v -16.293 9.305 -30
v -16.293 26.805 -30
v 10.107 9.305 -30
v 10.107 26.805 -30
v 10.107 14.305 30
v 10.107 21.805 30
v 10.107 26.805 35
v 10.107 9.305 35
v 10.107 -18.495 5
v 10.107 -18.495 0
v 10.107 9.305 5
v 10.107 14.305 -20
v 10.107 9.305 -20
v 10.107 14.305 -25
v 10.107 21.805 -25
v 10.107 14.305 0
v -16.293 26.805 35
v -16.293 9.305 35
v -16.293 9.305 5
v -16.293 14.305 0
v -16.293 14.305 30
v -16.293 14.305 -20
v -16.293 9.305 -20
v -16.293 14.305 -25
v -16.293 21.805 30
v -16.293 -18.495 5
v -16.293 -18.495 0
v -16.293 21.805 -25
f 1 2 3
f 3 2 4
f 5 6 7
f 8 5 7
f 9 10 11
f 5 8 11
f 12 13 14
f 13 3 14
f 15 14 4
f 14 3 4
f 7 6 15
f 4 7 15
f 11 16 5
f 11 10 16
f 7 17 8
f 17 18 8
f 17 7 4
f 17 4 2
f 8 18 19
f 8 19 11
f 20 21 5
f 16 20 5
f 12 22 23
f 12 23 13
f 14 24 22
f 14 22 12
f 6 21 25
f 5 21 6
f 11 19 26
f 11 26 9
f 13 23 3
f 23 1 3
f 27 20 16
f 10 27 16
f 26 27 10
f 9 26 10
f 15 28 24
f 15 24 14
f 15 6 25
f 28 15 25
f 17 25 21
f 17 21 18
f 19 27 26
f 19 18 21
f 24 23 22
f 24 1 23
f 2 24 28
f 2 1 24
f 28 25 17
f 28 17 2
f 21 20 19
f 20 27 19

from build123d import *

# Parameters (mm, degrees)
SKETCH1_W           = 26.4
SKETCH1_H           = 32.8
BOSS_EXTRUDE1_DEPTH = 5
SKETCH2_W           = 26.4
SKETCH2_H           = 5
BOSS_EXTRUDE2_DEPTH = 30
SKETCH3_W           = 26.4
SKETCH3_H           = 5
BOSS_EXTRUDE3_DEPTH = 12.5
SKETCH4_W           = 26.4
SKETCH4_H           = 5
BOSS_EXTRUDE4_DEPTH = 60
SKETCH5_W           = 26.4
SKETCH5_H           = 5
BOSS_EXTRUDE5_DEPTH = 12.5
SKETCH6_W           = 26.4
SKETCH6_H           = 5
BOSS_EXTRUDE8_DEPTH = 5


with BuildPart() as part:
    # Sketch1 → Boss-Extrude1 (new body)
    with BuildSketch(Plane.XY):
        with Locations((-3.092887029, -2.09539749)):
            Rectangle(SKETCH1_W, SKETCH1_H)
    extrude(amount=BOSS_EXTRUDE1_DEPTH)

    # Sketch2 → Boss-Extrude2 (add)
    with BuildSketch(Plane.XY.offset(5)):
        with Locations((-3.092887029, 11.80460251)):
            Rectangle(SKETCH2_W, SKETCH2_H)
    extrude(amount=BOSS_EXTRUDE2_DEPTH)

    # Sketch3 → Boss-Extrude3 (add)
    with BuildSketch(Plane(origin=(0, 14.30460251, 0), x_dir=(1, 0, 0), z_dir=(0, 1, 0))):
        with Locations((-3.092887029, -32.5)):
            Rectangle(SKETCH3_W, SKETCH3_H)
    extrude(amount=BOSS_EXTRUDE3_DEPTH)

    # Sketch4 → Boss-Extrude4 (add)
    with BuildSketch(Plane(origin=(0, 0, 30), x_dir=(-1, 0, 0), z_dir=(0, 0, -1))):
        with Locations((3.092887029, 24.30460251)):
            Rectangle(SKETCH4_W, SKETCH4_H)
    extrude(amount=BOSS_EXTRUDE4_DEPTH)

    # Sketch5 → Boss-Extrude5 (add)
    with BuildSketch(Plane.XZ.offset(-21.80460251)):
        with Locations((-3.092887029, -27.5)):
            Rectangle(SKETCH5_W, SKETCH5_H)
    extrude(amount=BOSS_EXTRUDE5_DEPTH)

    # Sketch6 → Boss-Extrude8 (add)
    with BuildSketch(Plane.XY.offset(-25)):
        with Locations((-3.092887029, 11.80460251)):
            Rectangle(SKETCH6_W, SKETCH6_H)
    extrude(amount=BOSS_EXTRUDE8_DEPTH)


solid = part.part
